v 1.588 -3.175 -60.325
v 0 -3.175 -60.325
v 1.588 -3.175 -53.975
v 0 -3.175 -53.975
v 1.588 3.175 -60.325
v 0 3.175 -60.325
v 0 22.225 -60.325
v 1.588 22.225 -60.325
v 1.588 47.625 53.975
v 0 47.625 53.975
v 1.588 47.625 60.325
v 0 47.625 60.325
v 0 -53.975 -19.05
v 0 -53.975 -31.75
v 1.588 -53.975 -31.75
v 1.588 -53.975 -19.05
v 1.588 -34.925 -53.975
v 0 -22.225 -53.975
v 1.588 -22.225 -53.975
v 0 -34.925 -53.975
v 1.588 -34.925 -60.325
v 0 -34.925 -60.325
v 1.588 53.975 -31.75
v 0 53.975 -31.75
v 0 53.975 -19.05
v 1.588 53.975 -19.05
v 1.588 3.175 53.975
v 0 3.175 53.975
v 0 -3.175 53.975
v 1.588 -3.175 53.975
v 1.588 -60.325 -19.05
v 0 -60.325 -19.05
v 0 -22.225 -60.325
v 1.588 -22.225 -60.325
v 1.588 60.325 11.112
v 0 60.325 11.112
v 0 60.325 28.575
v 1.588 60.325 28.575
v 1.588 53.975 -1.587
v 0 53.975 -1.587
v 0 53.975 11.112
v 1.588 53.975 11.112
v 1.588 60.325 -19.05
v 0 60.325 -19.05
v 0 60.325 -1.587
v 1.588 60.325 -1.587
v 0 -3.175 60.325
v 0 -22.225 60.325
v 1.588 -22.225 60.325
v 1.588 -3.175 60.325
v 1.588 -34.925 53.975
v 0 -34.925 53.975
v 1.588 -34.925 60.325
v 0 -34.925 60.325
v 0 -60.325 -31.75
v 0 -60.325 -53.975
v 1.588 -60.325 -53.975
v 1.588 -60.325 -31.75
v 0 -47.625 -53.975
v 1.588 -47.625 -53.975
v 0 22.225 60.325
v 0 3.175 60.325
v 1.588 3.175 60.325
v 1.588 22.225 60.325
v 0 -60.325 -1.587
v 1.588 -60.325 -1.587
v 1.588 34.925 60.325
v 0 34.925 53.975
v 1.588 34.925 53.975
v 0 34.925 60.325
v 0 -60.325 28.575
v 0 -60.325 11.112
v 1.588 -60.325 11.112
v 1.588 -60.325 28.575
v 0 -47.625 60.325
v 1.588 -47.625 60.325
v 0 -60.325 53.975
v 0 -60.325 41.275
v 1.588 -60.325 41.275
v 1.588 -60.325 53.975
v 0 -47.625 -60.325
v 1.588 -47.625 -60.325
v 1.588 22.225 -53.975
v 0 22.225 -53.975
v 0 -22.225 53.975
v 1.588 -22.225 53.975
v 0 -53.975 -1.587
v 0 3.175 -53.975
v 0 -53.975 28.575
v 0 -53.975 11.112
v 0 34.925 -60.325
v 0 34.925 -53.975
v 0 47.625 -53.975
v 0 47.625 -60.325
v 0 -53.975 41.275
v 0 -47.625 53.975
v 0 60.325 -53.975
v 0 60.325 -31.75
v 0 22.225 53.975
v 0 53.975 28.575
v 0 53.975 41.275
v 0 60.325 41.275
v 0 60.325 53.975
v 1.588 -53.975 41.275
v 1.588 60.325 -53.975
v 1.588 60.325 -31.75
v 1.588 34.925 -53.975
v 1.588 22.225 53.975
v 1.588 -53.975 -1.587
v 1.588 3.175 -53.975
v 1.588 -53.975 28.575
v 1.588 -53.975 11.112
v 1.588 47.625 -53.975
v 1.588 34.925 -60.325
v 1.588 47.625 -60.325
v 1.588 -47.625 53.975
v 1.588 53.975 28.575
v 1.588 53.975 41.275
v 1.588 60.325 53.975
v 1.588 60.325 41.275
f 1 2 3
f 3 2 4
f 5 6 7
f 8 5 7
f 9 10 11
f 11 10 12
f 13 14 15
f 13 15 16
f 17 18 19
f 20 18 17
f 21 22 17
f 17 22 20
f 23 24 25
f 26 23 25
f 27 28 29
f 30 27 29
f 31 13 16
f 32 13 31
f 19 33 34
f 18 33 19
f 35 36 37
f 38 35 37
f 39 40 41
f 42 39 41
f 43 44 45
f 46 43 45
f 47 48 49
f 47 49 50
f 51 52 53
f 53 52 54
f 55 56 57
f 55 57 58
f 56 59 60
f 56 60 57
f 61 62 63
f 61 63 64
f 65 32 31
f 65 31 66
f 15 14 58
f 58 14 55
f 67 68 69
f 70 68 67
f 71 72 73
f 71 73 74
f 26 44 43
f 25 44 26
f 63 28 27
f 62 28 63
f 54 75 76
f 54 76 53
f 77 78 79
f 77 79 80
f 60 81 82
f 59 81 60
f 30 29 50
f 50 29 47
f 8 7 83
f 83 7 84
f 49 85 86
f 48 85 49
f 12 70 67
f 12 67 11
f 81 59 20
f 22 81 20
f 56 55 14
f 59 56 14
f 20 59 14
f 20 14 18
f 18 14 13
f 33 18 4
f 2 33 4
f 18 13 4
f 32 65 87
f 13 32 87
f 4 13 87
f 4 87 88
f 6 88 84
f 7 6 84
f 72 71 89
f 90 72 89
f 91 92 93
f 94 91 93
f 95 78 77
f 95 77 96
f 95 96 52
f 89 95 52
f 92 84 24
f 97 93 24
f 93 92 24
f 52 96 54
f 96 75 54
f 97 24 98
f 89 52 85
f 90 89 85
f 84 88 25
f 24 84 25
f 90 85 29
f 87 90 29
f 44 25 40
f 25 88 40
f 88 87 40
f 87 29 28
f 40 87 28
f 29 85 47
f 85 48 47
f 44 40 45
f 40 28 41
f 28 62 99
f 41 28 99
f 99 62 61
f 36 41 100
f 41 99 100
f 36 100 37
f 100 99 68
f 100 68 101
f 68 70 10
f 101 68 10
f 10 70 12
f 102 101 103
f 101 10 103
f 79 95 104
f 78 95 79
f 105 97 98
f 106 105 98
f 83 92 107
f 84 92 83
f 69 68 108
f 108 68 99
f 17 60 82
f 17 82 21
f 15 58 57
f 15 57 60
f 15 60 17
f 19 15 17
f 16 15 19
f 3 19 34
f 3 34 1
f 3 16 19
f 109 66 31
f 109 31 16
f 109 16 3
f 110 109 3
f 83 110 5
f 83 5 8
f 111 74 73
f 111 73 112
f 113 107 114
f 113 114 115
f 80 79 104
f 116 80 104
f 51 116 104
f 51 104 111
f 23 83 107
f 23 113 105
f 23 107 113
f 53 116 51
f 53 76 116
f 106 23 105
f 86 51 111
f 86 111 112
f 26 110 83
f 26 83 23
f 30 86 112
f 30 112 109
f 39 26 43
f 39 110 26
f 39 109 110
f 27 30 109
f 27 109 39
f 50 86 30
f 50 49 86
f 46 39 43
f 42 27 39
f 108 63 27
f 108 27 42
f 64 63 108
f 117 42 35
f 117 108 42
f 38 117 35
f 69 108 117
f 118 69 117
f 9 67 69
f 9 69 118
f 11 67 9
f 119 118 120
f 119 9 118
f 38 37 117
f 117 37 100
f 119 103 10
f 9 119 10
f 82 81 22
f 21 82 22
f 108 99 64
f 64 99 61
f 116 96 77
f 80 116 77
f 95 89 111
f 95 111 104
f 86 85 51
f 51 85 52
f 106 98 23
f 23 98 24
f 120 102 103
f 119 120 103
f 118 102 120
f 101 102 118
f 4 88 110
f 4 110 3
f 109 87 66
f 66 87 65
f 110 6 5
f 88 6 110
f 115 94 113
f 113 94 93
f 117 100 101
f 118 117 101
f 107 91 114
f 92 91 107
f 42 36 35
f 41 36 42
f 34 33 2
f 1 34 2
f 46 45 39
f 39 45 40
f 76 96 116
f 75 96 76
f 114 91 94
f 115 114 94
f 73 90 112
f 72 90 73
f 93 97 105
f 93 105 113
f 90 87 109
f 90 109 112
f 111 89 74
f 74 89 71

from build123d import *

# Parameters (mm, degrees)
F0_W      = 120.65
F0_H      = 120.65
F1_DEPTH  = 1.5875
F2_W      = 12.7
F2_H      = 6.35
F3_DEPTH  = 1.5875
F4_W      = 12.7
F4_H      = 6.35
F5_DEPTH  = 1.5875
F6_W      = 6.35
F6_H      = 6.35
F7_DEPTH  = 1.5875
F8_W      = 12.7
F8_H      = 6.35
F9_DEPTH  = 1.5875
F10_W     = 12.7
F10_H     = 6.35
F11_DEPTH = 1.5875
F12_W     = 6.35
F12_H     = 12.7
F13_DEPTH = 1.5875
F14_W     = 6.35
F14_H     = 12.7
F15_DEPTH = 1.5875
F16_W     = 6.35
F16_H     = 12.7
F17_DEPTH = 1.5875
F18_W     = 12.7
F18_H     = 6.35
F19_DEPTH = 1.5875
F20_W     = 12.7
F20_H     = 6.35
F20_W_2   = 6.35
F21_DEPTH = 1.5875
F22_W     = 6.35
F22_H     = 12.7
F23_DEPTH = 1.5875
F24_W     = 6.35
F24_H     = 12.7
F25_DEPTH = 1.5875


with BuildPart() as f1:
    # F0 (on Right) → F1 (new body)
    with BuildSketch(Plane.YZ):
        Rectangle(F0_W, F0_H)
    extrude(amount=F1_DEPTH)

    # F2 (on face) → F3 (cut)
    with BuildSketch(Plane(origin=(0, 0, 0), x_dir=(0, -1, 0), z_dir=(-1, 0, 0))):
        with Locations((53.975, 57.15)):
            Rectangle(F2_W, F2_H)
    extrude(amount=-F3_DEPTH, mode=Mode.SUBTRACT)

    # F4 (on face) → F5 (cut)
    with BuildSketch(Plane(origin=(0, 0, 0), x_dir=(0, -1, 0), z_dir=(-1, 0, 0))):
        with Locations((28.575, 57.15)):
            Rectangle(F4_W, F4_H)
    extrude(amount=-F5_DEPTH, mode=Mode.SUBTRACT)

    # F6 (on face) → F7 (cut)
    with BuildSketch(Plane(origin=(0, 0, 0), x_dir=(0, -1, 0), z_dir=(-1, 0, 0))):
        with Locations((0, 57.15)):
            Rectangle(F6_W, F6_H)
    extrude(amount=-F7_DEPTH, mode=Mode.SUBTRACT)

    # F8 (on face) → F9 (cut)
    with BuildSketch(Plane(origin=(0, 0, 0), x_dir=(0, -1, 0), z_dir=(-1, 0, 0))):
        with Locations((-53.975, 57.15)):
            Rectangle(F8_W, F8_H)
    extrude(amount=-F9_DEPTH, mode=Mode.SUBTRACT)

    # F10 (on face) → F11 (cut)
    with BuildSketch(Plane(origin=(0, 0, 0), x_dir=(0, -1, 0), z_dir=(-1, 0, 0))):
        with Locations((-28.575, 57.15)):
            Rectangle(F10_W, F10_H)
    extrude(amount=-F11_DEPTH, mode=Mode.SUBTRACT)

    # F12 (on face) → F13 (cut)
    with BuildSketch(Plane(origin=(0, 0, 0), x_dir=(0, -1, 0), z_dir=(-1, 0, 0))):
        with Locations((-57.15, 34.925)):
            Rectangle(F12_W, F12_H)
    extrude(amount=-F13_DEPTH, mode=Mode.SUBTRACT)

    # F14 (on face) → F15 (cut)
    with BuildSketch(Plane(origin=(0, 0, 0), x_dir=(0, -1, 0), z_dir=(-1, 0, 0))):
        with Locations((-57.15, 4.7625)):
            Rectangle(F14_W, F14_H)
    extrude(amount=-F15_DEPTH, mode=Mode.SUBTRACT)

    # F16 (on face) → F17 (cut)
    with BuildSketch(Plane(origin=(0, 0, 0), x_dir=(0, -1, 0), z_dir=(-1, 0, 0))):
        with Locations((-57.15, -25.4)):
            Rectangle(F16_W, F16_H)
    extrude(amount=-F17_DEPTH, mode=Mode.SUBTRACT)

    # F18 (on face) → F19 (cut)
    with BuildSketch(Plane(origin=(0, 0, 0), x_dir=(0, -1, 0), z_dir=(-1, 0, 0))):
        with Locations((-53.975, -57.15)):
            Rectangle(F18_W, F18_H)
        with Locations((53.975, -57.15)):
            Rectangle(F18_W, F18_H)
    extrude(amount=-F19_DEPTH, mode=Mode.SUBTRACT)

    # F20 (on face) → F21 (cut)
    with BuildSketch(Plane(origin=(0, 0, 0), x_dir=(0, -1, 0), z_dir=(-1, 0, 0))):
        with Locations((-28.575, -57.15)):
            Rectangle(F20_W, F20_H)
        with Locations((0, -57.15)):
            Rectangle(F20_W_2, F20_H)
        with Locations((28.575, -57.15)):
            Rectangle(F20_W, F20_H)
    extrude(amount=-F21_DEPTH, mode=Mode.SUBTRACT)

    # F22 (on face) → F23 (cut)
    with BuildSketch(Plane(origin=(0, 0, 0), x_dir=(0, -1, 0), z_dir=(-1, 0, 0))):
        with Locations((57.15, 34.925)):
            Rectangle(F22_W, F22_H)
        with Locations((57.15, 4.7625)):
            Rectangle(F22_W, F22_H)
    extrude(amount=-F23_DEPTH, mode=Mode.SUBTRACT)

    # F24 (on face) → F25 (cut)
    with BuildSketch(Plane(origin=(0, 0, 0), x_dir=(0, -1, 0), z_dir=(-1, 0, 0))):
        with Locations((57.15, -25.4)):
            Rectangle(F24_W, F24_H)
    extrude(amount=-F25_DEPTH, mode=Mode.SUBTRACT)


solid = f1.part
